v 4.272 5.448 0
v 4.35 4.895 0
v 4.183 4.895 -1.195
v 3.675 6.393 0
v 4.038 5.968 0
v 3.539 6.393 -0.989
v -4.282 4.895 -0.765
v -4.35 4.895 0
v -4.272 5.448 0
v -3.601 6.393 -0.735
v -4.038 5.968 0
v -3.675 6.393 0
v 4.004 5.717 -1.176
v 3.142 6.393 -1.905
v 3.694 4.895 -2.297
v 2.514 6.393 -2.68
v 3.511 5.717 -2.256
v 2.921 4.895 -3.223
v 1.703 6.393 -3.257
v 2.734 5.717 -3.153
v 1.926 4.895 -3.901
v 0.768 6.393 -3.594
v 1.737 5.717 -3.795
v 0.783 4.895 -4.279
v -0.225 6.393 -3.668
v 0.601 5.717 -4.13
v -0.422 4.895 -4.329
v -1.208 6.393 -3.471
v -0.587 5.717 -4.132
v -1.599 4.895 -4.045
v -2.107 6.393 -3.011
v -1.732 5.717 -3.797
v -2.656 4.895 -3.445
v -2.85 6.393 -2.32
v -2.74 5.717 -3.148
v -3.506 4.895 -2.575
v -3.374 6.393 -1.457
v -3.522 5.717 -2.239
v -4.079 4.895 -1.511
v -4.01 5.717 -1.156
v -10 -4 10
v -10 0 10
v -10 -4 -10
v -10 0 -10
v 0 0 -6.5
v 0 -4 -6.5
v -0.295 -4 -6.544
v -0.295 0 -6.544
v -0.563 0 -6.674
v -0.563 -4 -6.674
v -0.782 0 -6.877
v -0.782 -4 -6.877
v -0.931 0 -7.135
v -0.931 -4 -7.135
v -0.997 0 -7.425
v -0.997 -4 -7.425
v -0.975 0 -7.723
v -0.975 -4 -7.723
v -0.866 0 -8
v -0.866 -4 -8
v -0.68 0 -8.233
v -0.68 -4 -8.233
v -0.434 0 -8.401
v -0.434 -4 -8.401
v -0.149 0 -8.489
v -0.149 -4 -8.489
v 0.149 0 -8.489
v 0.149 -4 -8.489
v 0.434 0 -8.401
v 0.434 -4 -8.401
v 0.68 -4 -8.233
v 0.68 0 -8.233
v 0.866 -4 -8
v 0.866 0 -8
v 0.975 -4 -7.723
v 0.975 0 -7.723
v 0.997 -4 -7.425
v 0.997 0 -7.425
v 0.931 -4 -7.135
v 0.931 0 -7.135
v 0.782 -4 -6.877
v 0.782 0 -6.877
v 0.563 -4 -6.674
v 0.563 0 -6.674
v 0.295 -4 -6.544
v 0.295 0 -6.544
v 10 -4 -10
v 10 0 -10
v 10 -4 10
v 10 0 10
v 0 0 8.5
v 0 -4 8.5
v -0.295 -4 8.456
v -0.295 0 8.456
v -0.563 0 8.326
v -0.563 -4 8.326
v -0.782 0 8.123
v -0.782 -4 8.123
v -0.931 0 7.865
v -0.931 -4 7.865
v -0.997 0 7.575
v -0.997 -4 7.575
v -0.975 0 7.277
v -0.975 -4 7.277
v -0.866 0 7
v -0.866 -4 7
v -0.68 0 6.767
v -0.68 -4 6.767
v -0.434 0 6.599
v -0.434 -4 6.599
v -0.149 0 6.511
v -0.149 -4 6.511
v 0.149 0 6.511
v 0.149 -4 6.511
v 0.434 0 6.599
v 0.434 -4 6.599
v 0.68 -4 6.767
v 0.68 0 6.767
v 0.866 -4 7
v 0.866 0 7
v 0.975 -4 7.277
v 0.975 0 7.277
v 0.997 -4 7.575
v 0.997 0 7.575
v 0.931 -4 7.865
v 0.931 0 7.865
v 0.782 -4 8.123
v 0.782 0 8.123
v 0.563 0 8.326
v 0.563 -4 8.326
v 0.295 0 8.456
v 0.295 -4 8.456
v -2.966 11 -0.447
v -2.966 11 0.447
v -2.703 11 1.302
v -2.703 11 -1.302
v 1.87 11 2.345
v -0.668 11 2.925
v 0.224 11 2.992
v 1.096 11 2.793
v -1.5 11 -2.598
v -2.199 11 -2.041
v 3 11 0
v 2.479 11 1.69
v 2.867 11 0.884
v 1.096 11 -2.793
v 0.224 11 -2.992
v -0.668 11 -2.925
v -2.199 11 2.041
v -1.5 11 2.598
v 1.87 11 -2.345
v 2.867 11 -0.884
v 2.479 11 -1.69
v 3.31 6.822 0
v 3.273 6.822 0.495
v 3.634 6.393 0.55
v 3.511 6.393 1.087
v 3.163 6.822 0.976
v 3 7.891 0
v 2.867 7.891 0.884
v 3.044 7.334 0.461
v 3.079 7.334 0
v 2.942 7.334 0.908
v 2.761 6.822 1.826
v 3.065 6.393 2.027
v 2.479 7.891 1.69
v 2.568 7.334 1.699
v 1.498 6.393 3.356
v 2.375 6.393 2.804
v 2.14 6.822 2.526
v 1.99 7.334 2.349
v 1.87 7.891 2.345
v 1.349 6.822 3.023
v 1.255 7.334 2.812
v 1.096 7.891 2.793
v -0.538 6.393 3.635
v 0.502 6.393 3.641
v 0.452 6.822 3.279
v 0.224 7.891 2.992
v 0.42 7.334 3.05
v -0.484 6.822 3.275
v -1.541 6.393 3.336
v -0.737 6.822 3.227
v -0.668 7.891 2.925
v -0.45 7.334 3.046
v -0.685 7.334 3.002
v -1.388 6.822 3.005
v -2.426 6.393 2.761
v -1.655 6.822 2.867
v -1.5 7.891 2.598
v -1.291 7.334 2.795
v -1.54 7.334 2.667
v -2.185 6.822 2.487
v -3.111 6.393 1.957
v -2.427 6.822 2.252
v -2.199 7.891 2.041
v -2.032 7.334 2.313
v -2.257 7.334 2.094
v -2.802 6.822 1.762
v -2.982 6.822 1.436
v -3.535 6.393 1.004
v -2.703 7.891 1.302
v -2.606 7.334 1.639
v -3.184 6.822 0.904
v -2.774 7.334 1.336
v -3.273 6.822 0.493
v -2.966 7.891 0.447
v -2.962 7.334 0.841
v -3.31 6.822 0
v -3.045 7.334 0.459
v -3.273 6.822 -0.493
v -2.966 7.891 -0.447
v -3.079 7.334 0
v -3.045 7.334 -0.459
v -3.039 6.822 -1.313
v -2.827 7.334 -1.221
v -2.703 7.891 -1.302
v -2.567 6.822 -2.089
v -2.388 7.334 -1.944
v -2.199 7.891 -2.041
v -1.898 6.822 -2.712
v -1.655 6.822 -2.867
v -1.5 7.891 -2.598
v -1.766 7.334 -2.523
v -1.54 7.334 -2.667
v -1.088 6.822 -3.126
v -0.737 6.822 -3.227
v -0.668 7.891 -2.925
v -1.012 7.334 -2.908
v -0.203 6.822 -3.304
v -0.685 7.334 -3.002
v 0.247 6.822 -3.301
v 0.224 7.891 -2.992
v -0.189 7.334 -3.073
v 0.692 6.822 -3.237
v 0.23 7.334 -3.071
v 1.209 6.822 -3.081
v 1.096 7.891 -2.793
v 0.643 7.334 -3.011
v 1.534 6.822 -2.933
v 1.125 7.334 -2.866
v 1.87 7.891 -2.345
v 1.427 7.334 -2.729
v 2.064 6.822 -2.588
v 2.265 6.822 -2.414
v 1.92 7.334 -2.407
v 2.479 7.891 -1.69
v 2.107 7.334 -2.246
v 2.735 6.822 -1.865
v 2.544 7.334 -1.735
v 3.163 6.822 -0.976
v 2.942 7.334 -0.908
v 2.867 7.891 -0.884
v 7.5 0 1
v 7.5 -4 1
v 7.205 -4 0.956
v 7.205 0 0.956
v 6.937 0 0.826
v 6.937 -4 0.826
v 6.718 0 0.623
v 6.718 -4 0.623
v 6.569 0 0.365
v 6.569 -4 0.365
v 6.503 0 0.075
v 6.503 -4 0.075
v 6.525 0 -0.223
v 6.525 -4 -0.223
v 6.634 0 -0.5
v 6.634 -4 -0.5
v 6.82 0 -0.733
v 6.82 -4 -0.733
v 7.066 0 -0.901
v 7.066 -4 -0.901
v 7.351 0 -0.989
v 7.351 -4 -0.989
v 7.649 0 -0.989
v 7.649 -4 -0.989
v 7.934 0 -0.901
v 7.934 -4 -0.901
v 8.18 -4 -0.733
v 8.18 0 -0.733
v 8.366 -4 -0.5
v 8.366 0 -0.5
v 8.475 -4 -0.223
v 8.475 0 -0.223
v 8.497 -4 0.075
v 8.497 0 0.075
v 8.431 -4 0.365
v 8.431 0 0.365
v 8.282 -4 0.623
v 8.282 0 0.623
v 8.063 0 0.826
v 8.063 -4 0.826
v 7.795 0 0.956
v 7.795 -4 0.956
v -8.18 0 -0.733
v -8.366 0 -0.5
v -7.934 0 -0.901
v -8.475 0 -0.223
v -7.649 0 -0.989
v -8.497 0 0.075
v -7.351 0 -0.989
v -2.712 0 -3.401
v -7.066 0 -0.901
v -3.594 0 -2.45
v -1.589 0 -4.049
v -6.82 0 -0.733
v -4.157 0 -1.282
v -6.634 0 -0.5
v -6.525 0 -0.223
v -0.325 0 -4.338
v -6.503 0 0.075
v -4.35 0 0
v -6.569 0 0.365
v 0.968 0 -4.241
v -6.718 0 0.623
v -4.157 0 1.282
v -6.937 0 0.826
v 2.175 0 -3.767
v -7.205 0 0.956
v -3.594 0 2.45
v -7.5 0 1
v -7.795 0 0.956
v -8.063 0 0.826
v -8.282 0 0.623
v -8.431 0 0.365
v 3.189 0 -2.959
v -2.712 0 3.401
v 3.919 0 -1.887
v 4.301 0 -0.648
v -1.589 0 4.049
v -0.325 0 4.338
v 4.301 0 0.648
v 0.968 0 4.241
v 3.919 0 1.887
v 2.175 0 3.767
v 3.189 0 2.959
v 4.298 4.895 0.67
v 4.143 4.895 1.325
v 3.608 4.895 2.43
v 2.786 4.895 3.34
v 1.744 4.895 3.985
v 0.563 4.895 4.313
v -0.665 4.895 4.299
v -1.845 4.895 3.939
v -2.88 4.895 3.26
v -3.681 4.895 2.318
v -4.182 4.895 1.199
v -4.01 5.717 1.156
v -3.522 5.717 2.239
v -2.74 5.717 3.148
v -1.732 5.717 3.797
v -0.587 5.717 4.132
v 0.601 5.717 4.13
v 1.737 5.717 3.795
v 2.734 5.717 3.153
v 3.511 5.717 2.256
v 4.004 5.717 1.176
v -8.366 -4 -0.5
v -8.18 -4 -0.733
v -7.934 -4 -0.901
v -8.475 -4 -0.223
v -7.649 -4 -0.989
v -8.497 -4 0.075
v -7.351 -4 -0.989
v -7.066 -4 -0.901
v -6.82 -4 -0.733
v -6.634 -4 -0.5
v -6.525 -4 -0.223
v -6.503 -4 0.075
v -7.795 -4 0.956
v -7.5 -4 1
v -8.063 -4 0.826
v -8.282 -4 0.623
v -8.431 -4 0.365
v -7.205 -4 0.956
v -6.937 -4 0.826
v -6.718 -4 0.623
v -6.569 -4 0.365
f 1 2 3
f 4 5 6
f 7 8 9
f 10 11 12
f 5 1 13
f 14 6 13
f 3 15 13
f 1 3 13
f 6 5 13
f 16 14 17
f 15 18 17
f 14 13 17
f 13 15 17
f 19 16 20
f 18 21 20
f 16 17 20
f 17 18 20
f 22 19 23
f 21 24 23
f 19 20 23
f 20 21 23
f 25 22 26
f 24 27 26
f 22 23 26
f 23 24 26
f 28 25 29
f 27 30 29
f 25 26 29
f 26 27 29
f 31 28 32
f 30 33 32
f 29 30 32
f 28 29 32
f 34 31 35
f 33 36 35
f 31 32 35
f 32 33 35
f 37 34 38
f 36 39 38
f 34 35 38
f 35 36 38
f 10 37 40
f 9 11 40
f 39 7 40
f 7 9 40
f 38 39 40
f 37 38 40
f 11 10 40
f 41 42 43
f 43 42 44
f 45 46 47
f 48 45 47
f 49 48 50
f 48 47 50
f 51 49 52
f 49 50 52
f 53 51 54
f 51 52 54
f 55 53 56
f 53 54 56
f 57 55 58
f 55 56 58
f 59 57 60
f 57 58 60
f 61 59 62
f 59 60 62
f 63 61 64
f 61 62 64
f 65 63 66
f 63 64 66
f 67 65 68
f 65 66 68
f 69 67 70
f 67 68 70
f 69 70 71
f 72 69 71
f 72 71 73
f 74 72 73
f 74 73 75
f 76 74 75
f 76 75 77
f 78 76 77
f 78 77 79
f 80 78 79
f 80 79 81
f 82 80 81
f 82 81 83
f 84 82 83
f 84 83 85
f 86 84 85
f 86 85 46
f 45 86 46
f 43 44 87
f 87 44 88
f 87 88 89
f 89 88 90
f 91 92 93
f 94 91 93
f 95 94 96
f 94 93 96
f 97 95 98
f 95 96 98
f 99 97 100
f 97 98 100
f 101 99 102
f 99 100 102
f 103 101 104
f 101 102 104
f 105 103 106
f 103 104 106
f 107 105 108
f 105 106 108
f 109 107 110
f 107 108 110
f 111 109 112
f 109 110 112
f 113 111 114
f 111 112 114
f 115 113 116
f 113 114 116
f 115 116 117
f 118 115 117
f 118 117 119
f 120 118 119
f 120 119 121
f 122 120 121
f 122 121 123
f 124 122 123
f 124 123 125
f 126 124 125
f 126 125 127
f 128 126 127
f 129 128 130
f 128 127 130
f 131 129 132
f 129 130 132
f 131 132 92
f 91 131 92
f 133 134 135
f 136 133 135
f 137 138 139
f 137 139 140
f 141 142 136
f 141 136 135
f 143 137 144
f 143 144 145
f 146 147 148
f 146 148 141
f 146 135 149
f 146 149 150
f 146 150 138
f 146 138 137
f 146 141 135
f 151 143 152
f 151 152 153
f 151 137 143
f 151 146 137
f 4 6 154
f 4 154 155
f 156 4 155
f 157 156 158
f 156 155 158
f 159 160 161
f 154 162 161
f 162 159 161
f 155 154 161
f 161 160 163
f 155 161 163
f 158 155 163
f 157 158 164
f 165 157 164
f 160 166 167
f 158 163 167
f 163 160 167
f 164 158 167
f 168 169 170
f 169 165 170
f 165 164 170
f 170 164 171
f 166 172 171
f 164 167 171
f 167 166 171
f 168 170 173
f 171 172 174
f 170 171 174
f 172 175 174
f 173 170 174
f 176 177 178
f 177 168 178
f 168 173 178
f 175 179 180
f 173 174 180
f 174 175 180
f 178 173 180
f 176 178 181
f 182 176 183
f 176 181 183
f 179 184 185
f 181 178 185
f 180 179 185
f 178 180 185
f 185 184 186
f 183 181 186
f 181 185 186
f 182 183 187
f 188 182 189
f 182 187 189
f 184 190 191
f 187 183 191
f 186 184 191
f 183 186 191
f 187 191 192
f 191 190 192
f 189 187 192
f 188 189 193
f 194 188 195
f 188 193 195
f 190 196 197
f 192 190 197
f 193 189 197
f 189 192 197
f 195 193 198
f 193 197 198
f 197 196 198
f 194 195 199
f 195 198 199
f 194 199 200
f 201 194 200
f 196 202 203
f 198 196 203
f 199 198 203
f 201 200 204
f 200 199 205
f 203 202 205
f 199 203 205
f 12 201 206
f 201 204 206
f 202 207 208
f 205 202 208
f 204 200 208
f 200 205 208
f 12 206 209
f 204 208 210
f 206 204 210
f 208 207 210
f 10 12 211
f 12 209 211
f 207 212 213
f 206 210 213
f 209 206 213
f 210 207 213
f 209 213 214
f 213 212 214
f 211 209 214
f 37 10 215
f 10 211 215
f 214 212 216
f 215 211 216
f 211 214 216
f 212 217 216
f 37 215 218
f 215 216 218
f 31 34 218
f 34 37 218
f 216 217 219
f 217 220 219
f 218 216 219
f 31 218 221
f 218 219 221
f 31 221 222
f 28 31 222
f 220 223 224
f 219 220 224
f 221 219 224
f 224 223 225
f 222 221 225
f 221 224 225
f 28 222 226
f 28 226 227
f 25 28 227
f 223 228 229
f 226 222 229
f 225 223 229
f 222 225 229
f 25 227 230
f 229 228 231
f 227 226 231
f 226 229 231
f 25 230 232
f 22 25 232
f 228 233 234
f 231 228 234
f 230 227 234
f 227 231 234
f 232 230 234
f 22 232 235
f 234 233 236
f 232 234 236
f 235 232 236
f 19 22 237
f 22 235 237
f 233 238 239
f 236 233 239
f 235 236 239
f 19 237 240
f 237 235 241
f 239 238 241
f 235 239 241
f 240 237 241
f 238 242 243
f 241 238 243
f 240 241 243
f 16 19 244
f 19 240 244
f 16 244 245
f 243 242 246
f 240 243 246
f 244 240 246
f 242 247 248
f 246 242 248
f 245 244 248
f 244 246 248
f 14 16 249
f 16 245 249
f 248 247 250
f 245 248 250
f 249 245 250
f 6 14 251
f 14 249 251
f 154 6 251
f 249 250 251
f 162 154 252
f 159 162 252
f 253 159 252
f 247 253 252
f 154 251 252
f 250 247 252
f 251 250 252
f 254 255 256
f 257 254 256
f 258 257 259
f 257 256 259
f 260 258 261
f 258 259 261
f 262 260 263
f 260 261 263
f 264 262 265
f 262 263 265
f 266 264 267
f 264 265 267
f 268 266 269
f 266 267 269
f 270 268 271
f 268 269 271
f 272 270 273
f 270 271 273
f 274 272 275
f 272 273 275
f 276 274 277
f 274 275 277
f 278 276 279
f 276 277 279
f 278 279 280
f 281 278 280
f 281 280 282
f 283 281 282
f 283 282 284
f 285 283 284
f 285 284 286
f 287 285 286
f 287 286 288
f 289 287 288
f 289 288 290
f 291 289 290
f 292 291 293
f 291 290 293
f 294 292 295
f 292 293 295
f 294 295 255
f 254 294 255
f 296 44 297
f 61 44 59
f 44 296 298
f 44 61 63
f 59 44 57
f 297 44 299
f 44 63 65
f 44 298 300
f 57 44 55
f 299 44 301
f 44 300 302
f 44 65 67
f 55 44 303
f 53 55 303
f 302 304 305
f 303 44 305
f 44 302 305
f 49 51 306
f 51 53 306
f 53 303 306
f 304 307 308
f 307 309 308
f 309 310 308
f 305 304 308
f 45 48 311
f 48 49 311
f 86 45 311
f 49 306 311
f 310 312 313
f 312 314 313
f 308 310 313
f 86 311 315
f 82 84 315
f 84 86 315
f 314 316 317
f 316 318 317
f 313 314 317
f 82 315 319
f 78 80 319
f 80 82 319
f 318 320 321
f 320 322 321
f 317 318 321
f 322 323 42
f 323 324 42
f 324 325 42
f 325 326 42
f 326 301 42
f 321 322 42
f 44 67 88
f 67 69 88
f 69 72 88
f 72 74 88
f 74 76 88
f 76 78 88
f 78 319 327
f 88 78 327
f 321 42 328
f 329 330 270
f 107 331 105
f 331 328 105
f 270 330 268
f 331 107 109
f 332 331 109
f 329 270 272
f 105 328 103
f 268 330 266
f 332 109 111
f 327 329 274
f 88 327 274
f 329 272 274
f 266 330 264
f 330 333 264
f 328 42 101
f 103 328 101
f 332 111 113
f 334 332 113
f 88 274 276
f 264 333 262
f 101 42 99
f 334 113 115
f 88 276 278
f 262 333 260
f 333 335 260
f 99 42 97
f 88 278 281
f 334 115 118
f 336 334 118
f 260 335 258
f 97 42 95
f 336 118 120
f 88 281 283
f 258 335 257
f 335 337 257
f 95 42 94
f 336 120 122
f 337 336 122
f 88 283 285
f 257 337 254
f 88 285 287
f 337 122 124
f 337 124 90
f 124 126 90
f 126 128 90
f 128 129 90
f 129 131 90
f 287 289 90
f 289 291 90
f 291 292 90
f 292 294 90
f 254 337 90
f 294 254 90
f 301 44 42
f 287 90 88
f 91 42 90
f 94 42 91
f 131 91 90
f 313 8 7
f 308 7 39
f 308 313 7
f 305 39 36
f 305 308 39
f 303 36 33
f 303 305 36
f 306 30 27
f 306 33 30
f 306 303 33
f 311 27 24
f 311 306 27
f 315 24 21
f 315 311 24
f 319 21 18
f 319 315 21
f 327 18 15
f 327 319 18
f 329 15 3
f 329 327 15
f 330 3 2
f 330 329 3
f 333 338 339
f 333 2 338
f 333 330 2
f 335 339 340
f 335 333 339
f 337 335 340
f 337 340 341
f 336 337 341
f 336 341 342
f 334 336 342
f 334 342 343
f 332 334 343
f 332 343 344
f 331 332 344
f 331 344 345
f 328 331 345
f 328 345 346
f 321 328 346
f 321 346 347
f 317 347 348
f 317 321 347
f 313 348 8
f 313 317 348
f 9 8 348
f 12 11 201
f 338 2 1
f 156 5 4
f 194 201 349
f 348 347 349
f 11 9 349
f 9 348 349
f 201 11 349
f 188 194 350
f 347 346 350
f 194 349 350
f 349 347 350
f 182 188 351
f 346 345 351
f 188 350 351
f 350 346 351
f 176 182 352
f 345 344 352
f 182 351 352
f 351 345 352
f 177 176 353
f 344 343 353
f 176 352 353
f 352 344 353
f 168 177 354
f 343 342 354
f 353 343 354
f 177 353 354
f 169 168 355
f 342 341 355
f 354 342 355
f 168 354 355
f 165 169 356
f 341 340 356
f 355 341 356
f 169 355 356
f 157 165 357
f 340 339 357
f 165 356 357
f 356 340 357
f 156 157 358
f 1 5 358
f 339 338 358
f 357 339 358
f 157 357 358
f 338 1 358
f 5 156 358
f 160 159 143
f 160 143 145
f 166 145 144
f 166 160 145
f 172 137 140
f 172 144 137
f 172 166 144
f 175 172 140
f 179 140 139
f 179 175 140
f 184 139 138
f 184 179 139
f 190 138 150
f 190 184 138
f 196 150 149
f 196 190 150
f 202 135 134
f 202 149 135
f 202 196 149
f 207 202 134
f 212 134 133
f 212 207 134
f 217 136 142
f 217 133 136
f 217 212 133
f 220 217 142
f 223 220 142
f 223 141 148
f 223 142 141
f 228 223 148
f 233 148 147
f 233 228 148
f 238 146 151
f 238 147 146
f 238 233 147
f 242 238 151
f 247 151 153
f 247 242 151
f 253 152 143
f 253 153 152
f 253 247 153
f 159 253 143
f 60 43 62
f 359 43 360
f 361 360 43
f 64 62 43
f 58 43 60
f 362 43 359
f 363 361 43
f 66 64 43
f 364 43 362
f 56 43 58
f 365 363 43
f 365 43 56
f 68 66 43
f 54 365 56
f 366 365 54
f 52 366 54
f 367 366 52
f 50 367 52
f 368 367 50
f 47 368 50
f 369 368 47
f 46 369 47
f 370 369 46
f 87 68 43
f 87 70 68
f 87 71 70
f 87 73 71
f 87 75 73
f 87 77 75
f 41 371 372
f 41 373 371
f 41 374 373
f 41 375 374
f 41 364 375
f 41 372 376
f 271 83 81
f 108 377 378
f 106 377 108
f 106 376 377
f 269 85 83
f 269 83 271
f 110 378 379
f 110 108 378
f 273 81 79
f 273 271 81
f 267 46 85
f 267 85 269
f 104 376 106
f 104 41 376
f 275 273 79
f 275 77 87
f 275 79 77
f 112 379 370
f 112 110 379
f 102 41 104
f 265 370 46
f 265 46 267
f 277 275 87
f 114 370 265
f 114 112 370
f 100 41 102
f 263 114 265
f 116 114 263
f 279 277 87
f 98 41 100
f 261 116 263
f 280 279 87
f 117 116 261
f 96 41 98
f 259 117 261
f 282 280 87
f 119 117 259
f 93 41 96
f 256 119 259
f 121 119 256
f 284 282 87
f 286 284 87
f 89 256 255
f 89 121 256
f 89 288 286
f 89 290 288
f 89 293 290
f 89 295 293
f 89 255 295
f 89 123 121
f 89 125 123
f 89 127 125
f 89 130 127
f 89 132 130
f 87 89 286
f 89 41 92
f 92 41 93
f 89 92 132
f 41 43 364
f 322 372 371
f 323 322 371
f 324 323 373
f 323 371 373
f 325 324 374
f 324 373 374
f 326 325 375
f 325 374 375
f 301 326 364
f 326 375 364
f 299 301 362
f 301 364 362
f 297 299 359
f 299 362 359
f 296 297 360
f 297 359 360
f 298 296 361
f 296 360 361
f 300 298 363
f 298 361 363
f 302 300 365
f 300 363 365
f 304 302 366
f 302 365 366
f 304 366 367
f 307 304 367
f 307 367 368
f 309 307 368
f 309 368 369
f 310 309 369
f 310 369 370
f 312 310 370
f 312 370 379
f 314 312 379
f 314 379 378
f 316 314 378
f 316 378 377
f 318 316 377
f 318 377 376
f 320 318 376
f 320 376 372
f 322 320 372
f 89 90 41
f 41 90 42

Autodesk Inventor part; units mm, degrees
ref_plane "YZ Plane" through (0, 0, 0) normal (1, 0, 0) x (0, 1, 0)
ref_plane "XZ Plane" through (0, 0, 0) normal (0, 1, 0) x (-1, 0, 0)
ref_plane "XY Plane" through (0, 0, 0) normal (0, 0, 1) x (1, 0, 0)
sketch "Sketch1" plane through (0, 0, 0) normal (0, 1, 0) x (-1, 0, 0)
  circle A0 centre (0, 0) radius 4.35
  dimension "d0" = 8.7
extrude "Extrusion1" add sketch "Sketch1" along normal blind 6
sketch "Sketch2" plane through (0, 6, 0) normal (0, 1, 0) x (1, 0, 0)
  circle A0 centre (0, 0) radius 3
  dimension "d3" = 6
extrude "Extrusion2" add sketch "Sketch2" along normal blind 5
fillet "Fillet1" radius 2 1 edges at (-3, 6, 0)
sketch "Sketch3" plane through (0, 0, 0) normal (0, -1, 0) x (1, 0, 0)
  line L0 (-10, -10) -> (10, -10)
  line L1 (10, -10) -> (10, 10)
  line L2 (10, 10) -> (-10, 10)
  line L3 (-10, 10) -> (-10, -10)
  line L4 (-10, -10) -> (10, 10) construction
  line L5 (10, -10) -> (-10, 10) construction
  point P0 (0, 0)
  dimension "d7" = 20
  dimension "d8" = 20
extrude "Extrusion3" add sketch "Sketch3" along normal blind 4
sketch "Sketch4" plane through (0, 0, 0) normal (0, 1, 0) x (1, 0, 0)
  circle A0 centre (0, 0) radius 3 projected
  circle A1 centre (0, 0) radius 7.5
  circle A2 centre (-7.5, 0) radius 1
  circle A3 centre (0, -7.5) radius 1
  circle A4 centre (7.5, 0) radius 1
  circle A5 centre (0, 7.5) radius 1
  dimension "d11" = 15
  dimension "d12" = 2
  dimension "d15" = 360
hole "Hole1" at (-7.5, 0, 0) at (0, 0, 7.5) at (7.5, 0, 0) at (0, 0, -7.5) direction (0, -1, 0) diameter 2 end through all
fillet "Fillet2" radius 2 2 edges at (0, 6, -4.35) (0, 6, 4.35)
equation "\"d22\" = Thickness"
equation "\"BendRadius\" = Thickness"
equation "\"BendReliefWidth\" = Thickness"
equation "\"BendReliefDepth\" = 0.5 * Thickness"
equation "\"CornerReliefSize\" = 4 * Thickness"
equation "\"MinimumRemnant\" = 2 * Thickness"
equation "\"TransitionRadius\" = BendRadius"
equation "\"JacobiRadiusSize\" = BendRadius"
equation "\"GapSize\" = Thickness"
equation "\"Thickness\" = 0.5"
properties part number "placeHolder"
